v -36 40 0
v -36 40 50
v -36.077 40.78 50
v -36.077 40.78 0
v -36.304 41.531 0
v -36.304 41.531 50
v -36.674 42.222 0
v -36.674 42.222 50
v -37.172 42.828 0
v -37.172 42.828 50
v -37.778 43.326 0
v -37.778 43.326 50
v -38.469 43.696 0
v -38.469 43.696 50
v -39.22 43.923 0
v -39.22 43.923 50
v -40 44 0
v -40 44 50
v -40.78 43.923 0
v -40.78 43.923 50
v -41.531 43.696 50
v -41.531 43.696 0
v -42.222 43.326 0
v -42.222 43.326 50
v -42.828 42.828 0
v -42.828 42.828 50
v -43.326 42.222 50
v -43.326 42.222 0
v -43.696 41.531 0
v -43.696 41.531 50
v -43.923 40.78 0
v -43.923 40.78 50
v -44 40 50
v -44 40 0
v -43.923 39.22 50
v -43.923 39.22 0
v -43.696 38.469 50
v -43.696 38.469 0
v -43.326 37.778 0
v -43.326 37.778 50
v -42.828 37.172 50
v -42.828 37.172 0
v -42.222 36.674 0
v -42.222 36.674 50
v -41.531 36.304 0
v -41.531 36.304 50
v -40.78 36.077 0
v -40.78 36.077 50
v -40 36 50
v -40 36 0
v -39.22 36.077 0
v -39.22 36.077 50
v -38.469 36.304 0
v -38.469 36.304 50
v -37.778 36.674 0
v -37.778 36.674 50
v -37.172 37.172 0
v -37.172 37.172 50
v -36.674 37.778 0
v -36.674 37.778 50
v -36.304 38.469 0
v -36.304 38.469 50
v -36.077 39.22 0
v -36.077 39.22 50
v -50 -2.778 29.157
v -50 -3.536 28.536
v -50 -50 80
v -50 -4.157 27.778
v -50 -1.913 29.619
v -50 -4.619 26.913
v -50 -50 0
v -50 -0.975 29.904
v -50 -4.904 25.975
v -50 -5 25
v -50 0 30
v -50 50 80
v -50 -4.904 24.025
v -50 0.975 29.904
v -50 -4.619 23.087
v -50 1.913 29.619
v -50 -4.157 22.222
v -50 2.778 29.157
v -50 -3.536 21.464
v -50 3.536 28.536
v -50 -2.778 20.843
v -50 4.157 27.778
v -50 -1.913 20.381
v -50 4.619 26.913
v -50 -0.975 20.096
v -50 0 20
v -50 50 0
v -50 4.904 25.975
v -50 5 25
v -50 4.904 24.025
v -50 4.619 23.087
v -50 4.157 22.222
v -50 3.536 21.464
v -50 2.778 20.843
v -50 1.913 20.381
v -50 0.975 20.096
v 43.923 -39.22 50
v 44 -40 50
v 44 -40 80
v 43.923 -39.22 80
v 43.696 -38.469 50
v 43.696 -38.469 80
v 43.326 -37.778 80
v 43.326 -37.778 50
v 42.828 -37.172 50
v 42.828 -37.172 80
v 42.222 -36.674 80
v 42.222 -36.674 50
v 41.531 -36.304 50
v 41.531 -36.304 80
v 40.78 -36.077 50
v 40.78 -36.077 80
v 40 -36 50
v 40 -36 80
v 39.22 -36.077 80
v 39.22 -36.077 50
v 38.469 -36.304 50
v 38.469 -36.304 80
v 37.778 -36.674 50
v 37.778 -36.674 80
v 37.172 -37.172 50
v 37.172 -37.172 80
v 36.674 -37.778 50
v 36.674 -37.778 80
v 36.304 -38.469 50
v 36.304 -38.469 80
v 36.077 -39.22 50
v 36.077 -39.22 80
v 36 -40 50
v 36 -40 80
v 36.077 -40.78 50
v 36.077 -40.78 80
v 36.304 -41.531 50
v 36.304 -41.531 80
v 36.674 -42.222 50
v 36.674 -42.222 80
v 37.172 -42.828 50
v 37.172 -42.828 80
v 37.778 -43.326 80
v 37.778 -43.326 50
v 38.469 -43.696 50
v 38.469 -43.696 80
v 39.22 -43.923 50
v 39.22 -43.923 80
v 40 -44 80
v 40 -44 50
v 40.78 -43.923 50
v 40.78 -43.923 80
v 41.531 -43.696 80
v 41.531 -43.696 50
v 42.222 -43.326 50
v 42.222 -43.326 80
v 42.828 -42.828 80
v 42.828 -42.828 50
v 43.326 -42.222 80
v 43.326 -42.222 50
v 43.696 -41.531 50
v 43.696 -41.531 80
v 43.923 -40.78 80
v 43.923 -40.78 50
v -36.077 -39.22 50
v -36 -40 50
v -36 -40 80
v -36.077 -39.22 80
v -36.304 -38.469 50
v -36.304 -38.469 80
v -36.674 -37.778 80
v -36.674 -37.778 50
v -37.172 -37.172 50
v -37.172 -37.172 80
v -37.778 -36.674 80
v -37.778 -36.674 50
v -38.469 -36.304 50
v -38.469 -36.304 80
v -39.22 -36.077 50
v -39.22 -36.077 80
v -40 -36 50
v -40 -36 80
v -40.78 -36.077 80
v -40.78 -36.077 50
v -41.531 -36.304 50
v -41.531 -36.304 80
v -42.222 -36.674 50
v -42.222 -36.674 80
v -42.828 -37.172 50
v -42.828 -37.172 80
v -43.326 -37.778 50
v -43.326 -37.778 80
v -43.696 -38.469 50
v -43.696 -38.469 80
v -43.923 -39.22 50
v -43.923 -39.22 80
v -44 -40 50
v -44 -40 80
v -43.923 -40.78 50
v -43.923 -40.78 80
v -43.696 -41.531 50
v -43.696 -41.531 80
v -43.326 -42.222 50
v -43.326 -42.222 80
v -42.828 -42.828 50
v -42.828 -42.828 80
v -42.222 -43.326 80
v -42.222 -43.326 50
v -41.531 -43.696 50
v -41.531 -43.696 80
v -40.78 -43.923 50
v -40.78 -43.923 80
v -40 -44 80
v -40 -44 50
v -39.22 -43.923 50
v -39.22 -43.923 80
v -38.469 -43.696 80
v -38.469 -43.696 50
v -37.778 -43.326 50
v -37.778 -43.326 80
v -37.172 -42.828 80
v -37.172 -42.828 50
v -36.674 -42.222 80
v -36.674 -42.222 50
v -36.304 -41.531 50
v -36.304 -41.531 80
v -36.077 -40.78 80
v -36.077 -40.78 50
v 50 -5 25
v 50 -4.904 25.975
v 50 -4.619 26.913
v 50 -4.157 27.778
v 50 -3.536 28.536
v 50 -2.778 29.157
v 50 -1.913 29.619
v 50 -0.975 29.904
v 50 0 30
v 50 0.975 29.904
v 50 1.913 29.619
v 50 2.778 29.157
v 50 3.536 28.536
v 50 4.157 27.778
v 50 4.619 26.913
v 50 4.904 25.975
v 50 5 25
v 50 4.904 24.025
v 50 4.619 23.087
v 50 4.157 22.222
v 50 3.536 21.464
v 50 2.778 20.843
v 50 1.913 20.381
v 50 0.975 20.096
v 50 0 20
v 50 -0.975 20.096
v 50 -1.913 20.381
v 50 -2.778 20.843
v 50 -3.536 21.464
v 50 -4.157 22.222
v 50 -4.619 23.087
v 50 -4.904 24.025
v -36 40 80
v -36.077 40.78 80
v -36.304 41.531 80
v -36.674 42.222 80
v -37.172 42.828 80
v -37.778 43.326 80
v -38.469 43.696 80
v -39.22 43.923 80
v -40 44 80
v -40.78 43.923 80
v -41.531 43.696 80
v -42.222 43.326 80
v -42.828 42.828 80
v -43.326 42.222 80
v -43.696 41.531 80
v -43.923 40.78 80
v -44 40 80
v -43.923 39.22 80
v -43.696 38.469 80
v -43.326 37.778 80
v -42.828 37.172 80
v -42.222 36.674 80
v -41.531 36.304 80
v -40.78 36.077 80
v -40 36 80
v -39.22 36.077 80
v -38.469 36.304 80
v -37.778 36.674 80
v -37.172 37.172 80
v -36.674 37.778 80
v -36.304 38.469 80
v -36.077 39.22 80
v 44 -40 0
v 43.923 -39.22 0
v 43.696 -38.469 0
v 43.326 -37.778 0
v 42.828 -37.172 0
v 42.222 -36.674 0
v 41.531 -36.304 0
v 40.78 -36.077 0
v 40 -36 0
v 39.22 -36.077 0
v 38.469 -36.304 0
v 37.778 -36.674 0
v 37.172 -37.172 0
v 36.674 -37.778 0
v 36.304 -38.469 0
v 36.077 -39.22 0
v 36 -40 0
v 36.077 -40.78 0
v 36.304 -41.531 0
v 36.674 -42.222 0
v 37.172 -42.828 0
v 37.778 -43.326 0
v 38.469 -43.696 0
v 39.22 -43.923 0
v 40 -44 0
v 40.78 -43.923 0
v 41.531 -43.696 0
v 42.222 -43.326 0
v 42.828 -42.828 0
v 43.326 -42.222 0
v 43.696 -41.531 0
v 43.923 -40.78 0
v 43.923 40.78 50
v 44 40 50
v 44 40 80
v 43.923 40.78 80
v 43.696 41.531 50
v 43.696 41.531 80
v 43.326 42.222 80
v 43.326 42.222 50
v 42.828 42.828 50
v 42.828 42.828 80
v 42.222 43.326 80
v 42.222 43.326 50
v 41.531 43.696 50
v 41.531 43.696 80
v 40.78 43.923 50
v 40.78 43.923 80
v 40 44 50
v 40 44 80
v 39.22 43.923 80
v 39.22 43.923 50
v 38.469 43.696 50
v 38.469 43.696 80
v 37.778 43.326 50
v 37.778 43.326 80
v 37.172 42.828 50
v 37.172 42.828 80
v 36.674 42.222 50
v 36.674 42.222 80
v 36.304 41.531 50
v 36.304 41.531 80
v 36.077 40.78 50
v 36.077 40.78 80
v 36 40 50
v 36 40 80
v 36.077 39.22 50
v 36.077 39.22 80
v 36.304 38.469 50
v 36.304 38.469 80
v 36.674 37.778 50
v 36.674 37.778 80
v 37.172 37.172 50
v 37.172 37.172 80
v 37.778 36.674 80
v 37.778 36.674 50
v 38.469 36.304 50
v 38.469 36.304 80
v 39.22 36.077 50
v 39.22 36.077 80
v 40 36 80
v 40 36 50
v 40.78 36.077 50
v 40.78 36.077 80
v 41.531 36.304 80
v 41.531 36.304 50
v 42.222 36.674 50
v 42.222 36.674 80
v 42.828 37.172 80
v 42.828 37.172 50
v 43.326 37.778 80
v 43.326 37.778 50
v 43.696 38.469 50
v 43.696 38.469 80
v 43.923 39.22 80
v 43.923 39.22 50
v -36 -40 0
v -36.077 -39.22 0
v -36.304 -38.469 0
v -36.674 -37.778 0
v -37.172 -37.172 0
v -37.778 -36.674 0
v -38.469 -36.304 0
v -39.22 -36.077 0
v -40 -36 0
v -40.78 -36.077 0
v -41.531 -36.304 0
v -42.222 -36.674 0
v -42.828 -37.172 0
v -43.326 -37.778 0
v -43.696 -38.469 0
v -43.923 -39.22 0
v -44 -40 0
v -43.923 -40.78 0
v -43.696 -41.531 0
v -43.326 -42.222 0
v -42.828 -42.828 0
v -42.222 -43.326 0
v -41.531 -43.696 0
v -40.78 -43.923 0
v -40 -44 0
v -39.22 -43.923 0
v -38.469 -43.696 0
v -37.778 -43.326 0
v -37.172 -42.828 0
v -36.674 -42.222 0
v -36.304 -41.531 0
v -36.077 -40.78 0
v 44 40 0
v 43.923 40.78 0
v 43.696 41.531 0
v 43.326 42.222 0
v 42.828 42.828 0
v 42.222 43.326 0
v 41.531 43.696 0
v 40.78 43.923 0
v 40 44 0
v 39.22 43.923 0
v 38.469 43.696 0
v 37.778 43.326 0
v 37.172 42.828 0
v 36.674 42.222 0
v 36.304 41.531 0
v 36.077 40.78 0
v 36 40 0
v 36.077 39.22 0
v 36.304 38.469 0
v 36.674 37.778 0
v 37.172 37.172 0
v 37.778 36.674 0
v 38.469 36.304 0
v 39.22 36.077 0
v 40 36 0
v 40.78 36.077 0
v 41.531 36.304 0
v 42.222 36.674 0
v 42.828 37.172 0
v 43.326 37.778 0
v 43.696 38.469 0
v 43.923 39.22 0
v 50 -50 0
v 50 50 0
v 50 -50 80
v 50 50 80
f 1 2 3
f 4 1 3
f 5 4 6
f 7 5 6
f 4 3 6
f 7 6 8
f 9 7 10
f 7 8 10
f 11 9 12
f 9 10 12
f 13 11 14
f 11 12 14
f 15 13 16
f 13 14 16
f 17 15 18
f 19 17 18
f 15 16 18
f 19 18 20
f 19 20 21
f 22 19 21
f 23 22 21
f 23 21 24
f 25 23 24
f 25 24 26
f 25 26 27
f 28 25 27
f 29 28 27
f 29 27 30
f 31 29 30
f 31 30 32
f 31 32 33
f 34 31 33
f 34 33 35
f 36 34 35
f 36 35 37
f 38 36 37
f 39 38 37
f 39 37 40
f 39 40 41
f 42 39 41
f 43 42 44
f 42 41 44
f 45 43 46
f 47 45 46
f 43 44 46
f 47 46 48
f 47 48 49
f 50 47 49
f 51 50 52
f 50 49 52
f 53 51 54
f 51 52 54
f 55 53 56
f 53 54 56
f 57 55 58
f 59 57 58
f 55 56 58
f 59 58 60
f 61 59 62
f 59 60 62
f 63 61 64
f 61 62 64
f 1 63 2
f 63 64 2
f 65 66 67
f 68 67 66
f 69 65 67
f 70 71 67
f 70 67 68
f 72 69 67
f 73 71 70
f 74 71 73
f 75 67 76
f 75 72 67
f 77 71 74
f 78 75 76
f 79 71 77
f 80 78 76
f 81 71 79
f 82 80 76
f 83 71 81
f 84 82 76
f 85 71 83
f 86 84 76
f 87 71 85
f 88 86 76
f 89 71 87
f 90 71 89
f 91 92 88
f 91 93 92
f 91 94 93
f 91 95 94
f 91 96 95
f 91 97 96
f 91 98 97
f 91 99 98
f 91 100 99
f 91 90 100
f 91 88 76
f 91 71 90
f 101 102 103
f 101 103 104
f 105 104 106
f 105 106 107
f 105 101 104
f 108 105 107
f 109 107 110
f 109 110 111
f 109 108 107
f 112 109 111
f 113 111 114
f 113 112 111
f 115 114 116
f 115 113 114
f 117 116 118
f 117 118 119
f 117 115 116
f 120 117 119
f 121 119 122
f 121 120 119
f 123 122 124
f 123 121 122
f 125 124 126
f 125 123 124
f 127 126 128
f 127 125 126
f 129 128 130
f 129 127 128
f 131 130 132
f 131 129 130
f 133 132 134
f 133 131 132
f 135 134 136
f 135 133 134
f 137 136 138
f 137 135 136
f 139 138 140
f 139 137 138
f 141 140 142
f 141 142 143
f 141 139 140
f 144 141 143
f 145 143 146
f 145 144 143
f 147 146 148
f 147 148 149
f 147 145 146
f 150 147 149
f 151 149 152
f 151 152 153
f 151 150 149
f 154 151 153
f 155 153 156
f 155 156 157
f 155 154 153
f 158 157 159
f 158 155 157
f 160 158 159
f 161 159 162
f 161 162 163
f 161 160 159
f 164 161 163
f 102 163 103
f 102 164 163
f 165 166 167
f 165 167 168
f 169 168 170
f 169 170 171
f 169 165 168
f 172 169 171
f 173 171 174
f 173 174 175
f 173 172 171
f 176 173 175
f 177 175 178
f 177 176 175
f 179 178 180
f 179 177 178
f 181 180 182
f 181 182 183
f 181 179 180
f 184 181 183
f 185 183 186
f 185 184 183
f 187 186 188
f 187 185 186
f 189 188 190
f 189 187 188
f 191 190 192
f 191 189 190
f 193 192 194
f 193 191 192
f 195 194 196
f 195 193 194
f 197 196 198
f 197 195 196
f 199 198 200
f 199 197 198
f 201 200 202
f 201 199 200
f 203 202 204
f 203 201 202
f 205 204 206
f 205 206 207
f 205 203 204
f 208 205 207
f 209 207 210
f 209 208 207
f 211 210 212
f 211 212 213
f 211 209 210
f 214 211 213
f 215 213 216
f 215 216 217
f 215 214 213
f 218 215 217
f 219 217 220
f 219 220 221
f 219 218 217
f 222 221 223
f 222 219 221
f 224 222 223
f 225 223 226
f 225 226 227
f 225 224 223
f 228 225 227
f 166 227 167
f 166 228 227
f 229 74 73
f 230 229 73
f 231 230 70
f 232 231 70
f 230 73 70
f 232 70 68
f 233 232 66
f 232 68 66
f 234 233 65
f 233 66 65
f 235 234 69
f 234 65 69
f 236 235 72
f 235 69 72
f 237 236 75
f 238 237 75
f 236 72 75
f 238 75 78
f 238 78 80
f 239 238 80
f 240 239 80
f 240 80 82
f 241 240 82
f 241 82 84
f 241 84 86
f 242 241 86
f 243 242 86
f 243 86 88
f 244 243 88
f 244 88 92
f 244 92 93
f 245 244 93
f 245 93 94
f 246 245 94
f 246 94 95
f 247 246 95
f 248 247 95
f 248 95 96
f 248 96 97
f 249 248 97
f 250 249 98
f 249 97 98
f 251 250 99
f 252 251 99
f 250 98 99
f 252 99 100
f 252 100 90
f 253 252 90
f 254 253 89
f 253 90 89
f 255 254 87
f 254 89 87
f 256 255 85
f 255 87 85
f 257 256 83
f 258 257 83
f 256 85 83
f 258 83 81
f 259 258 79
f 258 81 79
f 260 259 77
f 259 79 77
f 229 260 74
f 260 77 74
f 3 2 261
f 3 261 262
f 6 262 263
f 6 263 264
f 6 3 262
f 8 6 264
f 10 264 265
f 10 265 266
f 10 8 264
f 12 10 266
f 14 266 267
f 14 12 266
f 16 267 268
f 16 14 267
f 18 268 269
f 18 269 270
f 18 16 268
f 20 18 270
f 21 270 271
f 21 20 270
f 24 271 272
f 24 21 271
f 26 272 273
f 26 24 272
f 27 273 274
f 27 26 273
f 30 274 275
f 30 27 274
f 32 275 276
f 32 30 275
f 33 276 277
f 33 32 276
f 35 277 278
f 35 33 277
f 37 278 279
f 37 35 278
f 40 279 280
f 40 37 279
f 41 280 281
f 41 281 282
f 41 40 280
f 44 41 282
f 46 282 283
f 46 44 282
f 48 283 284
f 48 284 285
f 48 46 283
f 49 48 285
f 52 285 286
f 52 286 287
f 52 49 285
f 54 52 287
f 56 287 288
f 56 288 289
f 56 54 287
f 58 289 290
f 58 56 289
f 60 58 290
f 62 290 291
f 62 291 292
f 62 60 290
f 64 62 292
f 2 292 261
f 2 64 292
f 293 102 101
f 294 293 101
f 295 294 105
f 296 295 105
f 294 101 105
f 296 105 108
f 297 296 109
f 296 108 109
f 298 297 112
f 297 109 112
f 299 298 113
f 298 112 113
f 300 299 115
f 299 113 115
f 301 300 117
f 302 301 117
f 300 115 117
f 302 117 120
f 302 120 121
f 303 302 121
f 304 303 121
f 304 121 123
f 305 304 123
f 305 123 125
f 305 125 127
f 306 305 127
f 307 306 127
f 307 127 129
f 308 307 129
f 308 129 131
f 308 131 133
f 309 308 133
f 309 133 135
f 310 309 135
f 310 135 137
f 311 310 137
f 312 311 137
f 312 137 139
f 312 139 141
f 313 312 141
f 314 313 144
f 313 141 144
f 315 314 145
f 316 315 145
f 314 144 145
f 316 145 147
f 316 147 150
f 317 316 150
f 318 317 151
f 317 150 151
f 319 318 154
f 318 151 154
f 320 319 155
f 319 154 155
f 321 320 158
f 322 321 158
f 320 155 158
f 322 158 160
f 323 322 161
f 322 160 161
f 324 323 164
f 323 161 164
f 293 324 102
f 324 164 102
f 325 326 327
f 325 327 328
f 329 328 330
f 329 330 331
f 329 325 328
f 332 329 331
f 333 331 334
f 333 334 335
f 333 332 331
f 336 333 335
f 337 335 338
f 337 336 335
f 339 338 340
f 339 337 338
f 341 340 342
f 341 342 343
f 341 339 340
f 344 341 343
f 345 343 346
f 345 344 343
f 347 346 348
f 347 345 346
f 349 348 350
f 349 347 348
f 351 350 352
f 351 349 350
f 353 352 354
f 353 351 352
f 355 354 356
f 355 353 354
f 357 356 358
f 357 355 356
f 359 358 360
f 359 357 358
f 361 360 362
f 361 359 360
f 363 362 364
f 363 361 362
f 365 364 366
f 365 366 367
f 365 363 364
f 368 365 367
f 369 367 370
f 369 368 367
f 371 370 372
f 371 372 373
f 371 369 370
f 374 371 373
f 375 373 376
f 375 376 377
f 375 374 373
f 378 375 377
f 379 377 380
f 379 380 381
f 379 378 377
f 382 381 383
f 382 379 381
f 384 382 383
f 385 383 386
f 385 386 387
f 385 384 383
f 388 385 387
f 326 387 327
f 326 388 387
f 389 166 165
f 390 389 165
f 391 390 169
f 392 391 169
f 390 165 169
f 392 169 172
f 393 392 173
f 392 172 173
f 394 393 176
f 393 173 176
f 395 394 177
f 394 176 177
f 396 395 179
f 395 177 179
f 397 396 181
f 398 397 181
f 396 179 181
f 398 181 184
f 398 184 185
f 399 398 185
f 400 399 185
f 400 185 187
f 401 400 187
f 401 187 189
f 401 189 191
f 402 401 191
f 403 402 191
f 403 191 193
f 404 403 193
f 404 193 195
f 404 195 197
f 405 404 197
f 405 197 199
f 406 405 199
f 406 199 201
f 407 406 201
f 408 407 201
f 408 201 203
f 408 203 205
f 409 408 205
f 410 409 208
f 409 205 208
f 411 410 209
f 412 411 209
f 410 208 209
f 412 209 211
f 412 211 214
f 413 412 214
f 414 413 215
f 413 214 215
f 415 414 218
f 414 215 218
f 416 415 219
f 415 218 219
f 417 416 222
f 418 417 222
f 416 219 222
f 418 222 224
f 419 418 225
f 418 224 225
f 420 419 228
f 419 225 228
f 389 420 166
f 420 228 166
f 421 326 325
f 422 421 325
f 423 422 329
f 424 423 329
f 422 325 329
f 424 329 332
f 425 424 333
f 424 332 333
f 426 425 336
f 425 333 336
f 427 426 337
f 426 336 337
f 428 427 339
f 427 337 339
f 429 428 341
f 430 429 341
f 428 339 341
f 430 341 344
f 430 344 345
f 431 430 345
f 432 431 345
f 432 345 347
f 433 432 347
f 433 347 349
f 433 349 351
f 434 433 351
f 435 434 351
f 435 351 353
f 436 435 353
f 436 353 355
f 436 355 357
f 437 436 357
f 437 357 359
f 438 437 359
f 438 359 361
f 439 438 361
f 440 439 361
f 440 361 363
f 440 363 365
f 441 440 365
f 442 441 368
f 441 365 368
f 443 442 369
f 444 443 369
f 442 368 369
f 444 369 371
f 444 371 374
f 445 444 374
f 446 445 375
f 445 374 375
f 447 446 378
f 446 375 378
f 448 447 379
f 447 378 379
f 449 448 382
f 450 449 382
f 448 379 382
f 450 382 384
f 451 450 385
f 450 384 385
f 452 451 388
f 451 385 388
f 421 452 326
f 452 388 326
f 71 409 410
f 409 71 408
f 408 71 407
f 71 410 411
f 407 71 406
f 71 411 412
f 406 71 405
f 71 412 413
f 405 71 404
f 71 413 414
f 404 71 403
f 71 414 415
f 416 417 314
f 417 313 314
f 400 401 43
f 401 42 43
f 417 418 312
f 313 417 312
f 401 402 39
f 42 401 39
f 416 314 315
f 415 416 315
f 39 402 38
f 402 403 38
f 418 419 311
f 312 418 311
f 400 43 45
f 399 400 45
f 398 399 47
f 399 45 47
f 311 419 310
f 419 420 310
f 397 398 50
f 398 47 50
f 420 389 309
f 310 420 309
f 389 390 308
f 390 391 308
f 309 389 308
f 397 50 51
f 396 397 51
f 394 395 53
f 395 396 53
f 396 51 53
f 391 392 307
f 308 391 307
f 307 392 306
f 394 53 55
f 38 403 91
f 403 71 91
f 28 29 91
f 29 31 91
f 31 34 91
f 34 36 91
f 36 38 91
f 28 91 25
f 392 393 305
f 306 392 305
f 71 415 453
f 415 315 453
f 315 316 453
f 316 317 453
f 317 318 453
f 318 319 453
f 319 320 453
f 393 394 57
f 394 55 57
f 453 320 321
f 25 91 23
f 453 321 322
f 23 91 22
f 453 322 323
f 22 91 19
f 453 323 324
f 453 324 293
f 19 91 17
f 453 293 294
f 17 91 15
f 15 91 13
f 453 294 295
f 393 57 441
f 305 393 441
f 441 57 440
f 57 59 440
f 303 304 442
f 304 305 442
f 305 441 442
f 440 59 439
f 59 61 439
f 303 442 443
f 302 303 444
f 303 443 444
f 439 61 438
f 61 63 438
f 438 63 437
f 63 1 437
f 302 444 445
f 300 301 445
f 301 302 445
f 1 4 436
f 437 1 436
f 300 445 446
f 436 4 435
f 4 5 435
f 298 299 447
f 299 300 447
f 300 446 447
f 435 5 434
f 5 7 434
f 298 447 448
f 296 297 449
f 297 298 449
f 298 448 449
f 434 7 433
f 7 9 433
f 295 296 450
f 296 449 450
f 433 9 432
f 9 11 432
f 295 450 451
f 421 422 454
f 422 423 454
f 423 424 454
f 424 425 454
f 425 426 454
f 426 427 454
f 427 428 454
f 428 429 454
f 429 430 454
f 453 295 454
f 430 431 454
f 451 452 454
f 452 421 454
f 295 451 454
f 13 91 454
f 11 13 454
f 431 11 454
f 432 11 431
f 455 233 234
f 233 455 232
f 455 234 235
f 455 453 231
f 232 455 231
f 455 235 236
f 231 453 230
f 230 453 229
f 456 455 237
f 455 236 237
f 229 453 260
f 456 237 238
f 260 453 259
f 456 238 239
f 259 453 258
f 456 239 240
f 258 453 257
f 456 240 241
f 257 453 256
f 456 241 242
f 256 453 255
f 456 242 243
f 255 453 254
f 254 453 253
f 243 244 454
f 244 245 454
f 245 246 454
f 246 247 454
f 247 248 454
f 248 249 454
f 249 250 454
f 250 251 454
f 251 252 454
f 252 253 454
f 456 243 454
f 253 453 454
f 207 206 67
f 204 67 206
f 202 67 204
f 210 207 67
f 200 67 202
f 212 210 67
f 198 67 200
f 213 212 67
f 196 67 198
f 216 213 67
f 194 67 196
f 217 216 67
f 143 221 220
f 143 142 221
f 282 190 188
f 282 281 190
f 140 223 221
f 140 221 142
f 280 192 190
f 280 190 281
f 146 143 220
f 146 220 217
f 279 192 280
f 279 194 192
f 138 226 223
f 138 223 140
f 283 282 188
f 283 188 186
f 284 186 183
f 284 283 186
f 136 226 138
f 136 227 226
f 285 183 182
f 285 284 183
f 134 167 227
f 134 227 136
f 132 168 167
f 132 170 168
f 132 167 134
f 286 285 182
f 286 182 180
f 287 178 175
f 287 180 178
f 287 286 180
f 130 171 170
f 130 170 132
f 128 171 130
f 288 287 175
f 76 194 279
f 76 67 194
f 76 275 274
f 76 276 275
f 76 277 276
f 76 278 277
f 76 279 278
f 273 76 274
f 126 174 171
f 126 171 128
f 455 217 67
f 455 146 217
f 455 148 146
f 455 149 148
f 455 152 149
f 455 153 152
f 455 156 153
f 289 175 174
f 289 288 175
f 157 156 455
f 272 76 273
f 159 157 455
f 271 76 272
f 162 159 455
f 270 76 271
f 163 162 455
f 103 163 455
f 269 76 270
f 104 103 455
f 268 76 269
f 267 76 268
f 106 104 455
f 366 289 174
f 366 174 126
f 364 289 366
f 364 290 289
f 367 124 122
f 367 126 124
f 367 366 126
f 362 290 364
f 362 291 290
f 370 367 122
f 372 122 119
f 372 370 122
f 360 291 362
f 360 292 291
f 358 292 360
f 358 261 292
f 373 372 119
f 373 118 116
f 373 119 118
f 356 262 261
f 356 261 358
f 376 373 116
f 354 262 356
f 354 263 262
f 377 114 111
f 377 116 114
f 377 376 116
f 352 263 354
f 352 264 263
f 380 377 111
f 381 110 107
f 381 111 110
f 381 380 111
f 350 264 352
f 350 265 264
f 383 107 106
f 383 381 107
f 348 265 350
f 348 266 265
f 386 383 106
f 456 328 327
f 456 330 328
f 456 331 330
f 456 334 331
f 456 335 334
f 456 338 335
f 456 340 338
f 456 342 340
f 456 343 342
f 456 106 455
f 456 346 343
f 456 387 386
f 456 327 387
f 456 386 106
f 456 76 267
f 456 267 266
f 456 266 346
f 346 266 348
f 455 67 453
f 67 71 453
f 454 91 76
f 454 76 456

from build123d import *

# Parameters (mm, degrees)
F0_W     = 100
F0_H     = 100
F1_DEPTH = 50
F2_W     = 100
F2_H     = 100
F2_R     = 4
F3_DEPTH = 30
F4_DEPTH = 50.001
F5_R     = 5
F6_DEPTH = 100.001


with BuildPart() as f1:
    # F0 (on Top) → F1 (new body)
    with BuildSketch(Plane.XY):
        Rectangle(F0_W, F0_H)
    extrude(amount=F1_DEPTH)

    # F2 (on face) → F3 (join)
    with BuildSketch(Plane.XY.offset(50)):
        Rectangle(F2_W, F2_H)
        with Locations((-40, -40)):
            Circle(F2_R, mode=Mode.SUBTRACT)
        with Locations((40, -40)):
            Circle(F2_R, mode=Mode.SUBTRACT)
        with Locations((-40, 40)):
            Circle(F2_R, mode=Mode.SUBTRACT)
        with Locations((40, 40)):
            Circle(F2_R, mode=Mode.SUBTRACT)
    extrude(amount=F3_DEPTH)

    # F4 (cut, through all): faces of the model
    f4_faces = [f1.faces().sort_by_distance(p)[0] for p in [
        (-40, 40, 50),
        (40, 40, 50),
        (40, -40, 50),
        (-40, -40, 50),
    ]]
    extrude(f4_faces, amount=-F4_DEPTH, mode=Mode.SUBTRACT)

    # F5 (on face) → F6 (cut, through all)
    with BuildSketch(Plane(origin=(-50, 0, 0), x_dir=(0, -1, 0), z_dir=(-1, 0, 0))):
        with Locations((0, 25)):
            Circle(F5_R)
    extrude(amount=-F6_DEPTH, mode=Mode.SUBTRACT)


solid = f1.part
